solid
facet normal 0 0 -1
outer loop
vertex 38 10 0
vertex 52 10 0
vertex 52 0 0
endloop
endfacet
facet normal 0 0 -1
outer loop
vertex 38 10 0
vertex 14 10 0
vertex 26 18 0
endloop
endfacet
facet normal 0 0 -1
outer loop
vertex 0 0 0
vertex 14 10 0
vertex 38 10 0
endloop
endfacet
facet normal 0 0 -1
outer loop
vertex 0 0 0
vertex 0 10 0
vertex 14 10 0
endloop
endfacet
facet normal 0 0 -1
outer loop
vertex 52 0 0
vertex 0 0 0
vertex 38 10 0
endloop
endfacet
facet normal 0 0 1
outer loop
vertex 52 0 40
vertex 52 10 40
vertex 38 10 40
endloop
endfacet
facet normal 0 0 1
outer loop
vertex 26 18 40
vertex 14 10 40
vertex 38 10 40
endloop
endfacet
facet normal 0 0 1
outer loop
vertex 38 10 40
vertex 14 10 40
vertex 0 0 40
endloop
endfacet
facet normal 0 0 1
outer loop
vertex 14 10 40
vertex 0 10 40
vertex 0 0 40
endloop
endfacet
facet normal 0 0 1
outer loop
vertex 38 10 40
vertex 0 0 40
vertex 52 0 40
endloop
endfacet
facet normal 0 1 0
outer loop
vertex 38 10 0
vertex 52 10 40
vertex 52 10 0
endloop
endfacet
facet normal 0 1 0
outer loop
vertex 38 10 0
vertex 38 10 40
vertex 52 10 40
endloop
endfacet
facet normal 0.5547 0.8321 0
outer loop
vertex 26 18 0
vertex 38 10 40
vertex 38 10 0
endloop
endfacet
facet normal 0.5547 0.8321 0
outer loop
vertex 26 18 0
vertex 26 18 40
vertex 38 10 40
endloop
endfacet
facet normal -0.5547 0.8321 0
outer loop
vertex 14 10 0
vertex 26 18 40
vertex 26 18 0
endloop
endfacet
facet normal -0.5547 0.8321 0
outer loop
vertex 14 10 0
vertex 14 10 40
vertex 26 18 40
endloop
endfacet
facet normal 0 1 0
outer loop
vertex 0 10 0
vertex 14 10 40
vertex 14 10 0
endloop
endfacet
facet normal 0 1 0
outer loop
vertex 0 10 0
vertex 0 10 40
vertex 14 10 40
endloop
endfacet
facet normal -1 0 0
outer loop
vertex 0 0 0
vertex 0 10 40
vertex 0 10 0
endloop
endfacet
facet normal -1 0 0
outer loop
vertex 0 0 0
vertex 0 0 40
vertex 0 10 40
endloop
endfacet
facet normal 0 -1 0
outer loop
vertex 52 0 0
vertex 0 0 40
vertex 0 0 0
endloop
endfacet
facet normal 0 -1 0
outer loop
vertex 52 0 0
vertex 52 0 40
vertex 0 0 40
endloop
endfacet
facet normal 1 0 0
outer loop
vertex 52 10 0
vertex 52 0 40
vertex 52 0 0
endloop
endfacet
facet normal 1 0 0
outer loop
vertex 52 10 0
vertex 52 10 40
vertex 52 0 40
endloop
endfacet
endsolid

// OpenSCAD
$fn = 32;

// ----------------------------------------------------------------------
// V guide rail: vrib, 52 mm wide
// ----------------------------------------------------------------------

// --- parameters (mm) ---
rail_w = 52;              // rail width, X
base_t = 10;              // base plate thickness
v_depth = 8;              // V feature depth / height
v_half_w = 12;            // half width of the V at the base face
plate_t = 40;             // rail length, Z (the extrusion height)

profile = [[0, 0], [52, 0], [52, 10], [38, 10], [26, 18], [14, 10], [0, 10]];  // primary outline, 7 points, counter clockwise

// --- the one profile operation ---
linear_extrude(height = plate_t) polygon(points = profile);
